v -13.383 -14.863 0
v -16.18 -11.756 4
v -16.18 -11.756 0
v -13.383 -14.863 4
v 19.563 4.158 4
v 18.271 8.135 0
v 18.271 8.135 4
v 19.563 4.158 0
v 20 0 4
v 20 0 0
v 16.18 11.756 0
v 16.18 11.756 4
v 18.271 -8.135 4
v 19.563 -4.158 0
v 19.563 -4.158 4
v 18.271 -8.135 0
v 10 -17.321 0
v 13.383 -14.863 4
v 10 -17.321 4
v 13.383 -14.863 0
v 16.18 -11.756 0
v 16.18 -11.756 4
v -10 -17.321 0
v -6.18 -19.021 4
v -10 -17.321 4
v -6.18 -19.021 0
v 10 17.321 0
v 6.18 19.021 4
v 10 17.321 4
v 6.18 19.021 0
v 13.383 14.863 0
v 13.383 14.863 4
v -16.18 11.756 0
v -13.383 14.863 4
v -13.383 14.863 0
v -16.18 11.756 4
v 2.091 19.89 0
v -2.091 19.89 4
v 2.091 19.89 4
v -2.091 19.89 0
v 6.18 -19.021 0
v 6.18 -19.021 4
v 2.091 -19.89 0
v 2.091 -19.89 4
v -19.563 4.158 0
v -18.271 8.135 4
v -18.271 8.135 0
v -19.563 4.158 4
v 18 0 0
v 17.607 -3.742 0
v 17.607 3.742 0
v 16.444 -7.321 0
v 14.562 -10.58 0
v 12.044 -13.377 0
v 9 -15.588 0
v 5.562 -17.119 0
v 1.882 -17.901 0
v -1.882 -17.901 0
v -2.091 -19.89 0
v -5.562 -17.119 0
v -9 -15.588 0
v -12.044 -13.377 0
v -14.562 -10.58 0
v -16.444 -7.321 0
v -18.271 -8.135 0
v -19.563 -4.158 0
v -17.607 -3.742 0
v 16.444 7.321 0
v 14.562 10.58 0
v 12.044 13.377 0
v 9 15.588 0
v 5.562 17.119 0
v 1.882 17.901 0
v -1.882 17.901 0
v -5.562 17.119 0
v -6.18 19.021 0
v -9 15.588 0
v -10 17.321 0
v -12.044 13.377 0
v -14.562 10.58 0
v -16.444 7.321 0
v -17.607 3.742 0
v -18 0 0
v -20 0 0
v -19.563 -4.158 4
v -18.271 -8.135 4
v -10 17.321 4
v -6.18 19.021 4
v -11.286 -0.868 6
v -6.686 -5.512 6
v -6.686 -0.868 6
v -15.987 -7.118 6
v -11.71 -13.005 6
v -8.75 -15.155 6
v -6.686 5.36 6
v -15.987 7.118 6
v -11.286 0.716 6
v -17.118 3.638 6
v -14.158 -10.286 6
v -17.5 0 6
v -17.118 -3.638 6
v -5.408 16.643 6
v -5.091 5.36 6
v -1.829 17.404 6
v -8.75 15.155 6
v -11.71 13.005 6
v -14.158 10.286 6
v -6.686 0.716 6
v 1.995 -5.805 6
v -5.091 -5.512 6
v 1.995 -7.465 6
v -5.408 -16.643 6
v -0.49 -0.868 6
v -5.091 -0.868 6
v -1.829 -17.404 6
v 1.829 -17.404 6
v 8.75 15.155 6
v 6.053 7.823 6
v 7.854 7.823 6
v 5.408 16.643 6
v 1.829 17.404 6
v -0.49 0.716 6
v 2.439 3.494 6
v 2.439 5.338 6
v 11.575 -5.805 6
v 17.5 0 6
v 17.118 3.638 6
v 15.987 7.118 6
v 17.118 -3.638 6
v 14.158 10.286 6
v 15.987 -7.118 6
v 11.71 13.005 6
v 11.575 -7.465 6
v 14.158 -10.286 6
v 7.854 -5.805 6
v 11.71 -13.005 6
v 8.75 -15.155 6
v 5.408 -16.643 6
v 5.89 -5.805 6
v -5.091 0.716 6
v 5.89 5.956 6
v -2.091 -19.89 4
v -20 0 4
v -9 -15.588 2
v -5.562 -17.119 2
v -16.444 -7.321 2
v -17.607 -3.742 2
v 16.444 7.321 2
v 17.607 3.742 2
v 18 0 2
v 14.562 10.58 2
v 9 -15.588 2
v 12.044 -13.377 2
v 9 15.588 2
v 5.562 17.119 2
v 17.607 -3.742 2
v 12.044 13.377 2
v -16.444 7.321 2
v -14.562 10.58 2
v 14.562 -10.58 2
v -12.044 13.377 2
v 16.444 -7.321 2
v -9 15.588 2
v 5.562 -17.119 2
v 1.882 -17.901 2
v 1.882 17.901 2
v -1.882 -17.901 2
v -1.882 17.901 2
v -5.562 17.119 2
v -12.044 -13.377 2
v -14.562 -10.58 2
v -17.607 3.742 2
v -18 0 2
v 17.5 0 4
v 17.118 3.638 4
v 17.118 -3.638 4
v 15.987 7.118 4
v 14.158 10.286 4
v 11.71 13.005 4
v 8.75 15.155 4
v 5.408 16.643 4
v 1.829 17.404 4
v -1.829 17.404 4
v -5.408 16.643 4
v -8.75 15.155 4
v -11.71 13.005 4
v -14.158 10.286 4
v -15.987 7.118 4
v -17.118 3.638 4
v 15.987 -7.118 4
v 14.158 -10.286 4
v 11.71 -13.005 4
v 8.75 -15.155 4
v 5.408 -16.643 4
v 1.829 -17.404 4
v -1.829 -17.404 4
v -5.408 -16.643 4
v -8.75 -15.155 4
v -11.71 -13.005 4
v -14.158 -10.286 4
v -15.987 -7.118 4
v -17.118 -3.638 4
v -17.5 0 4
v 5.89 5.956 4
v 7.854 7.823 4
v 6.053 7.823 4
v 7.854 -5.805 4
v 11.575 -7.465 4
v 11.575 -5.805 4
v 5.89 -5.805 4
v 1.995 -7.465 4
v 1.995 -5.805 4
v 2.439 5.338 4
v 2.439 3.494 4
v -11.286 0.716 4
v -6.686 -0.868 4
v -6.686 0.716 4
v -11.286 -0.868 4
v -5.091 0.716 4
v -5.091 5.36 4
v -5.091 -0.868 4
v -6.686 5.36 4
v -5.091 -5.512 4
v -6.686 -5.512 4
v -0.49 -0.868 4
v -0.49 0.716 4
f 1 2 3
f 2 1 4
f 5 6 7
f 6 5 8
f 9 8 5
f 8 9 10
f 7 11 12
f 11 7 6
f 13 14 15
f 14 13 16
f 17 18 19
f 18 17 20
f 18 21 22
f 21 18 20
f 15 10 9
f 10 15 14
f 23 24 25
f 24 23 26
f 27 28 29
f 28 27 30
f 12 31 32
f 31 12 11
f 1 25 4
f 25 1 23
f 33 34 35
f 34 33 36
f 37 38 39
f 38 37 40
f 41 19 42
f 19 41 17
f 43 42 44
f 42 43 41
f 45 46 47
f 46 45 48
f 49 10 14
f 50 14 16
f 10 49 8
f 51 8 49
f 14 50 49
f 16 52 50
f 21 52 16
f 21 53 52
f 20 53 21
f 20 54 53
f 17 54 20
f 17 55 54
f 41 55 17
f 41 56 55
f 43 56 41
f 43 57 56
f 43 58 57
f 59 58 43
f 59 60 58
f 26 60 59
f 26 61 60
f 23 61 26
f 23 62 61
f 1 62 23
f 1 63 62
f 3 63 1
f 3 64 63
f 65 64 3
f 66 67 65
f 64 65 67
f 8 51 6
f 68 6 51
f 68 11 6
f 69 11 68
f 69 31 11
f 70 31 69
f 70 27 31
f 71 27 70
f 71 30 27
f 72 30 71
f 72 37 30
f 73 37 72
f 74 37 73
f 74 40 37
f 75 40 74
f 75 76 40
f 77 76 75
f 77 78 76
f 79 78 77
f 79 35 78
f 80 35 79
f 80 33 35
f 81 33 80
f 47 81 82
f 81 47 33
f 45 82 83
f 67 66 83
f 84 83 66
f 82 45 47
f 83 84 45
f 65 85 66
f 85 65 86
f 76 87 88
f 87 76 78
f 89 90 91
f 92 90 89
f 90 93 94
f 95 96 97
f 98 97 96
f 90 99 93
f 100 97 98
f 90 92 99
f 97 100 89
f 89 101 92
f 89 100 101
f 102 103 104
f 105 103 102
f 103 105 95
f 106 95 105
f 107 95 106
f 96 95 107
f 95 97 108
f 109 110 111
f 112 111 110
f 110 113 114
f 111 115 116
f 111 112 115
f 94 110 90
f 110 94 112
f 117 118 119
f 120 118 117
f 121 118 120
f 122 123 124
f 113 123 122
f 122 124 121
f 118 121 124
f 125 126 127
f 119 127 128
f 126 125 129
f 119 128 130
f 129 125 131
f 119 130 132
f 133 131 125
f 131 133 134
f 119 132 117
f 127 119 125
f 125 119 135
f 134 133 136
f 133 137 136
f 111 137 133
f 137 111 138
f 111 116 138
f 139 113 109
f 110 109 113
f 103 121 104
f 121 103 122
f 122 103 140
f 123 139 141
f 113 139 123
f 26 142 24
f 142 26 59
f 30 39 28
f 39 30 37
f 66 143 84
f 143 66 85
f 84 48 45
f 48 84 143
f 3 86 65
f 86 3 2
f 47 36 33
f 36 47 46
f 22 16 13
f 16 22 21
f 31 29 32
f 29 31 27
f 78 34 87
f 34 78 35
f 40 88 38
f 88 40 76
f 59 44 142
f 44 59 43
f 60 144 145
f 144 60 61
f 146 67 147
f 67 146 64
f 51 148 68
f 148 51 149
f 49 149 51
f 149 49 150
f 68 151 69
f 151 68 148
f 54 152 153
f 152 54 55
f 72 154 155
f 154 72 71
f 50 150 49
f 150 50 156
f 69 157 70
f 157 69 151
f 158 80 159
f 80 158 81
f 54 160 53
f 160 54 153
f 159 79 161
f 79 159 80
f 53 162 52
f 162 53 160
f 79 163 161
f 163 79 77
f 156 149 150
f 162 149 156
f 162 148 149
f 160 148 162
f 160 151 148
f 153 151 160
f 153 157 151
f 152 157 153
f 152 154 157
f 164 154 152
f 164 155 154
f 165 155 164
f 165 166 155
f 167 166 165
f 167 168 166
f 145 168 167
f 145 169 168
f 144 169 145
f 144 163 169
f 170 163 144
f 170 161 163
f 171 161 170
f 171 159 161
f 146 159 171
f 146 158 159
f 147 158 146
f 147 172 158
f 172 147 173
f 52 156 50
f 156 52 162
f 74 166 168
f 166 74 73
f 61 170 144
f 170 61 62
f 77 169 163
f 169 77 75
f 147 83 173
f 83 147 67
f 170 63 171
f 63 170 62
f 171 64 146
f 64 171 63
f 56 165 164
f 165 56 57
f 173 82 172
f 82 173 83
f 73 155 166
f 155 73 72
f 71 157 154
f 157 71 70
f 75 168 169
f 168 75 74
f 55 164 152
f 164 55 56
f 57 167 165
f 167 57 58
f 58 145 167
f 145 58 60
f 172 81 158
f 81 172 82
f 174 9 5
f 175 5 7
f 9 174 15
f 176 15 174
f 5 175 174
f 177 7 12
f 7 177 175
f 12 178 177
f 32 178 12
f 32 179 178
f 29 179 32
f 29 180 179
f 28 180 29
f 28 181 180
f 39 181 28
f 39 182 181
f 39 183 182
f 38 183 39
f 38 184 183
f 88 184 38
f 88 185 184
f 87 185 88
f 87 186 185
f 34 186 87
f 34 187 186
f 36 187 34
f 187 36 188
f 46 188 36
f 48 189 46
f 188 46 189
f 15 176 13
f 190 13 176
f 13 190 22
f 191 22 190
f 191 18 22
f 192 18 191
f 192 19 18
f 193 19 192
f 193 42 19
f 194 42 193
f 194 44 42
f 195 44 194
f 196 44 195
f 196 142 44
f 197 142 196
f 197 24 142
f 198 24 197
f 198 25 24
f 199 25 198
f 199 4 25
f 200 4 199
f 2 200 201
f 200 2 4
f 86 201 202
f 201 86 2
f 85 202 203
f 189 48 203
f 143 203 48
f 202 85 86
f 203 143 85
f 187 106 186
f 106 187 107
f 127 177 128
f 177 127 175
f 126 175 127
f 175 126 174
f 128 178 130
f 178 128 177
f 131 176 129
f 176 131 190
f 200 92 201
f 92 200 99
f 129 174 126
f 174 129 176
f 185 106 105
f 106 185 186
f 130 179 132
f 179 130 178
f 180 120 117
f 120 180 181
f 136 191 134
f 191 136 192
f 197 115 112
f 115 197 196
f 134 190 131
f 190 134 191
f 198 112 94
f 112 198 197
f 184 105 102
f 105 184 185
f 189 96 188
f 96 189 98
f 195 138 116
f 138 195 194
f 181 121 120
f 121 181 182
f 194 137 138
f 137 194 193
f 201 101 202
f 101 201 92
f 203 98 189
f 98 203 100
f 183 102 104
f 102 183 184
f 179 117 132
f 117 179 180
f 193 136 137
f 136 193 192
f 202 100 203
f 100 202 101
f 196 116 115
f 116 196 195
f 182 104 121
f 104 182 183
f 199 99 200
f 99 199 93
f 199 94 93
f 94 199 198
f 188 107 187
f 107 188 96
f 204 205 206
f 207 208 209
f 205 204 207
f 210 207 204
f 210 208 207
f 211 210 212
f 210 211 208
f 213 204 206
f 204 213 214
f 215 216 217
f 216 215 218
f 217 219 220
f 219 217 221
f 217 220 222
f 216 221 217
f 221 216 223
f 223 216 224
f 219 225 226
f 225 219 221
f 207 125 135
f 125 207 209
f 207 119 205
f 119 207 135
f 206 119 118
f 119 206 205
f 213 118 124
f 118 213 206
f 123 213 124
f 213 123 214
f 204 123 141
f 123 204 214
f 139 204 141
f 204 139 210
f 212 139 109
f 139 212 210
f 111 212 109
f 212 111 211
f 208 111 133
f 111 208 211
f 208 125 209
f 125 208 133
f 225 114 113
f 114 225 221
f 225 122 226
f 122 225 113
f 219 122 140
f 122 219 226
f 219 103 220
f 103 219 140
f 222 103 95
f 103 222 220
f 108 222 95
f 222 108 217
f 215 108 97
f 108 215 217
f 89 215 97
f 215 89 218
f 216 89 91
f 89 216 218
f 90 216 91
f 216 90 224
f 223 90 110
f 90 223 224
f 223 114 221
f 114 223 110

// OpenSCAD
union() {
	difference() {
		difference() {
			difference() {
				cylinder(h = 6, r = 20);
				translate(v = [0, 0, -1]) {
					cylinder(h = 3, r = 18);
				}
			}
			translate(v = [0, 0, 4]) {
				difference() {
					cylinder(h = 3, r = 21);
					cylinder(h = 3, r = 17.5000000000);
				}
			}
		}
		translate(v = [0, 0, 4]) {
			linear_extrude(height = 3) {
				text(halign = "center", size = 16, text = "+1", valign = "center");
			}
		}
	}
}
